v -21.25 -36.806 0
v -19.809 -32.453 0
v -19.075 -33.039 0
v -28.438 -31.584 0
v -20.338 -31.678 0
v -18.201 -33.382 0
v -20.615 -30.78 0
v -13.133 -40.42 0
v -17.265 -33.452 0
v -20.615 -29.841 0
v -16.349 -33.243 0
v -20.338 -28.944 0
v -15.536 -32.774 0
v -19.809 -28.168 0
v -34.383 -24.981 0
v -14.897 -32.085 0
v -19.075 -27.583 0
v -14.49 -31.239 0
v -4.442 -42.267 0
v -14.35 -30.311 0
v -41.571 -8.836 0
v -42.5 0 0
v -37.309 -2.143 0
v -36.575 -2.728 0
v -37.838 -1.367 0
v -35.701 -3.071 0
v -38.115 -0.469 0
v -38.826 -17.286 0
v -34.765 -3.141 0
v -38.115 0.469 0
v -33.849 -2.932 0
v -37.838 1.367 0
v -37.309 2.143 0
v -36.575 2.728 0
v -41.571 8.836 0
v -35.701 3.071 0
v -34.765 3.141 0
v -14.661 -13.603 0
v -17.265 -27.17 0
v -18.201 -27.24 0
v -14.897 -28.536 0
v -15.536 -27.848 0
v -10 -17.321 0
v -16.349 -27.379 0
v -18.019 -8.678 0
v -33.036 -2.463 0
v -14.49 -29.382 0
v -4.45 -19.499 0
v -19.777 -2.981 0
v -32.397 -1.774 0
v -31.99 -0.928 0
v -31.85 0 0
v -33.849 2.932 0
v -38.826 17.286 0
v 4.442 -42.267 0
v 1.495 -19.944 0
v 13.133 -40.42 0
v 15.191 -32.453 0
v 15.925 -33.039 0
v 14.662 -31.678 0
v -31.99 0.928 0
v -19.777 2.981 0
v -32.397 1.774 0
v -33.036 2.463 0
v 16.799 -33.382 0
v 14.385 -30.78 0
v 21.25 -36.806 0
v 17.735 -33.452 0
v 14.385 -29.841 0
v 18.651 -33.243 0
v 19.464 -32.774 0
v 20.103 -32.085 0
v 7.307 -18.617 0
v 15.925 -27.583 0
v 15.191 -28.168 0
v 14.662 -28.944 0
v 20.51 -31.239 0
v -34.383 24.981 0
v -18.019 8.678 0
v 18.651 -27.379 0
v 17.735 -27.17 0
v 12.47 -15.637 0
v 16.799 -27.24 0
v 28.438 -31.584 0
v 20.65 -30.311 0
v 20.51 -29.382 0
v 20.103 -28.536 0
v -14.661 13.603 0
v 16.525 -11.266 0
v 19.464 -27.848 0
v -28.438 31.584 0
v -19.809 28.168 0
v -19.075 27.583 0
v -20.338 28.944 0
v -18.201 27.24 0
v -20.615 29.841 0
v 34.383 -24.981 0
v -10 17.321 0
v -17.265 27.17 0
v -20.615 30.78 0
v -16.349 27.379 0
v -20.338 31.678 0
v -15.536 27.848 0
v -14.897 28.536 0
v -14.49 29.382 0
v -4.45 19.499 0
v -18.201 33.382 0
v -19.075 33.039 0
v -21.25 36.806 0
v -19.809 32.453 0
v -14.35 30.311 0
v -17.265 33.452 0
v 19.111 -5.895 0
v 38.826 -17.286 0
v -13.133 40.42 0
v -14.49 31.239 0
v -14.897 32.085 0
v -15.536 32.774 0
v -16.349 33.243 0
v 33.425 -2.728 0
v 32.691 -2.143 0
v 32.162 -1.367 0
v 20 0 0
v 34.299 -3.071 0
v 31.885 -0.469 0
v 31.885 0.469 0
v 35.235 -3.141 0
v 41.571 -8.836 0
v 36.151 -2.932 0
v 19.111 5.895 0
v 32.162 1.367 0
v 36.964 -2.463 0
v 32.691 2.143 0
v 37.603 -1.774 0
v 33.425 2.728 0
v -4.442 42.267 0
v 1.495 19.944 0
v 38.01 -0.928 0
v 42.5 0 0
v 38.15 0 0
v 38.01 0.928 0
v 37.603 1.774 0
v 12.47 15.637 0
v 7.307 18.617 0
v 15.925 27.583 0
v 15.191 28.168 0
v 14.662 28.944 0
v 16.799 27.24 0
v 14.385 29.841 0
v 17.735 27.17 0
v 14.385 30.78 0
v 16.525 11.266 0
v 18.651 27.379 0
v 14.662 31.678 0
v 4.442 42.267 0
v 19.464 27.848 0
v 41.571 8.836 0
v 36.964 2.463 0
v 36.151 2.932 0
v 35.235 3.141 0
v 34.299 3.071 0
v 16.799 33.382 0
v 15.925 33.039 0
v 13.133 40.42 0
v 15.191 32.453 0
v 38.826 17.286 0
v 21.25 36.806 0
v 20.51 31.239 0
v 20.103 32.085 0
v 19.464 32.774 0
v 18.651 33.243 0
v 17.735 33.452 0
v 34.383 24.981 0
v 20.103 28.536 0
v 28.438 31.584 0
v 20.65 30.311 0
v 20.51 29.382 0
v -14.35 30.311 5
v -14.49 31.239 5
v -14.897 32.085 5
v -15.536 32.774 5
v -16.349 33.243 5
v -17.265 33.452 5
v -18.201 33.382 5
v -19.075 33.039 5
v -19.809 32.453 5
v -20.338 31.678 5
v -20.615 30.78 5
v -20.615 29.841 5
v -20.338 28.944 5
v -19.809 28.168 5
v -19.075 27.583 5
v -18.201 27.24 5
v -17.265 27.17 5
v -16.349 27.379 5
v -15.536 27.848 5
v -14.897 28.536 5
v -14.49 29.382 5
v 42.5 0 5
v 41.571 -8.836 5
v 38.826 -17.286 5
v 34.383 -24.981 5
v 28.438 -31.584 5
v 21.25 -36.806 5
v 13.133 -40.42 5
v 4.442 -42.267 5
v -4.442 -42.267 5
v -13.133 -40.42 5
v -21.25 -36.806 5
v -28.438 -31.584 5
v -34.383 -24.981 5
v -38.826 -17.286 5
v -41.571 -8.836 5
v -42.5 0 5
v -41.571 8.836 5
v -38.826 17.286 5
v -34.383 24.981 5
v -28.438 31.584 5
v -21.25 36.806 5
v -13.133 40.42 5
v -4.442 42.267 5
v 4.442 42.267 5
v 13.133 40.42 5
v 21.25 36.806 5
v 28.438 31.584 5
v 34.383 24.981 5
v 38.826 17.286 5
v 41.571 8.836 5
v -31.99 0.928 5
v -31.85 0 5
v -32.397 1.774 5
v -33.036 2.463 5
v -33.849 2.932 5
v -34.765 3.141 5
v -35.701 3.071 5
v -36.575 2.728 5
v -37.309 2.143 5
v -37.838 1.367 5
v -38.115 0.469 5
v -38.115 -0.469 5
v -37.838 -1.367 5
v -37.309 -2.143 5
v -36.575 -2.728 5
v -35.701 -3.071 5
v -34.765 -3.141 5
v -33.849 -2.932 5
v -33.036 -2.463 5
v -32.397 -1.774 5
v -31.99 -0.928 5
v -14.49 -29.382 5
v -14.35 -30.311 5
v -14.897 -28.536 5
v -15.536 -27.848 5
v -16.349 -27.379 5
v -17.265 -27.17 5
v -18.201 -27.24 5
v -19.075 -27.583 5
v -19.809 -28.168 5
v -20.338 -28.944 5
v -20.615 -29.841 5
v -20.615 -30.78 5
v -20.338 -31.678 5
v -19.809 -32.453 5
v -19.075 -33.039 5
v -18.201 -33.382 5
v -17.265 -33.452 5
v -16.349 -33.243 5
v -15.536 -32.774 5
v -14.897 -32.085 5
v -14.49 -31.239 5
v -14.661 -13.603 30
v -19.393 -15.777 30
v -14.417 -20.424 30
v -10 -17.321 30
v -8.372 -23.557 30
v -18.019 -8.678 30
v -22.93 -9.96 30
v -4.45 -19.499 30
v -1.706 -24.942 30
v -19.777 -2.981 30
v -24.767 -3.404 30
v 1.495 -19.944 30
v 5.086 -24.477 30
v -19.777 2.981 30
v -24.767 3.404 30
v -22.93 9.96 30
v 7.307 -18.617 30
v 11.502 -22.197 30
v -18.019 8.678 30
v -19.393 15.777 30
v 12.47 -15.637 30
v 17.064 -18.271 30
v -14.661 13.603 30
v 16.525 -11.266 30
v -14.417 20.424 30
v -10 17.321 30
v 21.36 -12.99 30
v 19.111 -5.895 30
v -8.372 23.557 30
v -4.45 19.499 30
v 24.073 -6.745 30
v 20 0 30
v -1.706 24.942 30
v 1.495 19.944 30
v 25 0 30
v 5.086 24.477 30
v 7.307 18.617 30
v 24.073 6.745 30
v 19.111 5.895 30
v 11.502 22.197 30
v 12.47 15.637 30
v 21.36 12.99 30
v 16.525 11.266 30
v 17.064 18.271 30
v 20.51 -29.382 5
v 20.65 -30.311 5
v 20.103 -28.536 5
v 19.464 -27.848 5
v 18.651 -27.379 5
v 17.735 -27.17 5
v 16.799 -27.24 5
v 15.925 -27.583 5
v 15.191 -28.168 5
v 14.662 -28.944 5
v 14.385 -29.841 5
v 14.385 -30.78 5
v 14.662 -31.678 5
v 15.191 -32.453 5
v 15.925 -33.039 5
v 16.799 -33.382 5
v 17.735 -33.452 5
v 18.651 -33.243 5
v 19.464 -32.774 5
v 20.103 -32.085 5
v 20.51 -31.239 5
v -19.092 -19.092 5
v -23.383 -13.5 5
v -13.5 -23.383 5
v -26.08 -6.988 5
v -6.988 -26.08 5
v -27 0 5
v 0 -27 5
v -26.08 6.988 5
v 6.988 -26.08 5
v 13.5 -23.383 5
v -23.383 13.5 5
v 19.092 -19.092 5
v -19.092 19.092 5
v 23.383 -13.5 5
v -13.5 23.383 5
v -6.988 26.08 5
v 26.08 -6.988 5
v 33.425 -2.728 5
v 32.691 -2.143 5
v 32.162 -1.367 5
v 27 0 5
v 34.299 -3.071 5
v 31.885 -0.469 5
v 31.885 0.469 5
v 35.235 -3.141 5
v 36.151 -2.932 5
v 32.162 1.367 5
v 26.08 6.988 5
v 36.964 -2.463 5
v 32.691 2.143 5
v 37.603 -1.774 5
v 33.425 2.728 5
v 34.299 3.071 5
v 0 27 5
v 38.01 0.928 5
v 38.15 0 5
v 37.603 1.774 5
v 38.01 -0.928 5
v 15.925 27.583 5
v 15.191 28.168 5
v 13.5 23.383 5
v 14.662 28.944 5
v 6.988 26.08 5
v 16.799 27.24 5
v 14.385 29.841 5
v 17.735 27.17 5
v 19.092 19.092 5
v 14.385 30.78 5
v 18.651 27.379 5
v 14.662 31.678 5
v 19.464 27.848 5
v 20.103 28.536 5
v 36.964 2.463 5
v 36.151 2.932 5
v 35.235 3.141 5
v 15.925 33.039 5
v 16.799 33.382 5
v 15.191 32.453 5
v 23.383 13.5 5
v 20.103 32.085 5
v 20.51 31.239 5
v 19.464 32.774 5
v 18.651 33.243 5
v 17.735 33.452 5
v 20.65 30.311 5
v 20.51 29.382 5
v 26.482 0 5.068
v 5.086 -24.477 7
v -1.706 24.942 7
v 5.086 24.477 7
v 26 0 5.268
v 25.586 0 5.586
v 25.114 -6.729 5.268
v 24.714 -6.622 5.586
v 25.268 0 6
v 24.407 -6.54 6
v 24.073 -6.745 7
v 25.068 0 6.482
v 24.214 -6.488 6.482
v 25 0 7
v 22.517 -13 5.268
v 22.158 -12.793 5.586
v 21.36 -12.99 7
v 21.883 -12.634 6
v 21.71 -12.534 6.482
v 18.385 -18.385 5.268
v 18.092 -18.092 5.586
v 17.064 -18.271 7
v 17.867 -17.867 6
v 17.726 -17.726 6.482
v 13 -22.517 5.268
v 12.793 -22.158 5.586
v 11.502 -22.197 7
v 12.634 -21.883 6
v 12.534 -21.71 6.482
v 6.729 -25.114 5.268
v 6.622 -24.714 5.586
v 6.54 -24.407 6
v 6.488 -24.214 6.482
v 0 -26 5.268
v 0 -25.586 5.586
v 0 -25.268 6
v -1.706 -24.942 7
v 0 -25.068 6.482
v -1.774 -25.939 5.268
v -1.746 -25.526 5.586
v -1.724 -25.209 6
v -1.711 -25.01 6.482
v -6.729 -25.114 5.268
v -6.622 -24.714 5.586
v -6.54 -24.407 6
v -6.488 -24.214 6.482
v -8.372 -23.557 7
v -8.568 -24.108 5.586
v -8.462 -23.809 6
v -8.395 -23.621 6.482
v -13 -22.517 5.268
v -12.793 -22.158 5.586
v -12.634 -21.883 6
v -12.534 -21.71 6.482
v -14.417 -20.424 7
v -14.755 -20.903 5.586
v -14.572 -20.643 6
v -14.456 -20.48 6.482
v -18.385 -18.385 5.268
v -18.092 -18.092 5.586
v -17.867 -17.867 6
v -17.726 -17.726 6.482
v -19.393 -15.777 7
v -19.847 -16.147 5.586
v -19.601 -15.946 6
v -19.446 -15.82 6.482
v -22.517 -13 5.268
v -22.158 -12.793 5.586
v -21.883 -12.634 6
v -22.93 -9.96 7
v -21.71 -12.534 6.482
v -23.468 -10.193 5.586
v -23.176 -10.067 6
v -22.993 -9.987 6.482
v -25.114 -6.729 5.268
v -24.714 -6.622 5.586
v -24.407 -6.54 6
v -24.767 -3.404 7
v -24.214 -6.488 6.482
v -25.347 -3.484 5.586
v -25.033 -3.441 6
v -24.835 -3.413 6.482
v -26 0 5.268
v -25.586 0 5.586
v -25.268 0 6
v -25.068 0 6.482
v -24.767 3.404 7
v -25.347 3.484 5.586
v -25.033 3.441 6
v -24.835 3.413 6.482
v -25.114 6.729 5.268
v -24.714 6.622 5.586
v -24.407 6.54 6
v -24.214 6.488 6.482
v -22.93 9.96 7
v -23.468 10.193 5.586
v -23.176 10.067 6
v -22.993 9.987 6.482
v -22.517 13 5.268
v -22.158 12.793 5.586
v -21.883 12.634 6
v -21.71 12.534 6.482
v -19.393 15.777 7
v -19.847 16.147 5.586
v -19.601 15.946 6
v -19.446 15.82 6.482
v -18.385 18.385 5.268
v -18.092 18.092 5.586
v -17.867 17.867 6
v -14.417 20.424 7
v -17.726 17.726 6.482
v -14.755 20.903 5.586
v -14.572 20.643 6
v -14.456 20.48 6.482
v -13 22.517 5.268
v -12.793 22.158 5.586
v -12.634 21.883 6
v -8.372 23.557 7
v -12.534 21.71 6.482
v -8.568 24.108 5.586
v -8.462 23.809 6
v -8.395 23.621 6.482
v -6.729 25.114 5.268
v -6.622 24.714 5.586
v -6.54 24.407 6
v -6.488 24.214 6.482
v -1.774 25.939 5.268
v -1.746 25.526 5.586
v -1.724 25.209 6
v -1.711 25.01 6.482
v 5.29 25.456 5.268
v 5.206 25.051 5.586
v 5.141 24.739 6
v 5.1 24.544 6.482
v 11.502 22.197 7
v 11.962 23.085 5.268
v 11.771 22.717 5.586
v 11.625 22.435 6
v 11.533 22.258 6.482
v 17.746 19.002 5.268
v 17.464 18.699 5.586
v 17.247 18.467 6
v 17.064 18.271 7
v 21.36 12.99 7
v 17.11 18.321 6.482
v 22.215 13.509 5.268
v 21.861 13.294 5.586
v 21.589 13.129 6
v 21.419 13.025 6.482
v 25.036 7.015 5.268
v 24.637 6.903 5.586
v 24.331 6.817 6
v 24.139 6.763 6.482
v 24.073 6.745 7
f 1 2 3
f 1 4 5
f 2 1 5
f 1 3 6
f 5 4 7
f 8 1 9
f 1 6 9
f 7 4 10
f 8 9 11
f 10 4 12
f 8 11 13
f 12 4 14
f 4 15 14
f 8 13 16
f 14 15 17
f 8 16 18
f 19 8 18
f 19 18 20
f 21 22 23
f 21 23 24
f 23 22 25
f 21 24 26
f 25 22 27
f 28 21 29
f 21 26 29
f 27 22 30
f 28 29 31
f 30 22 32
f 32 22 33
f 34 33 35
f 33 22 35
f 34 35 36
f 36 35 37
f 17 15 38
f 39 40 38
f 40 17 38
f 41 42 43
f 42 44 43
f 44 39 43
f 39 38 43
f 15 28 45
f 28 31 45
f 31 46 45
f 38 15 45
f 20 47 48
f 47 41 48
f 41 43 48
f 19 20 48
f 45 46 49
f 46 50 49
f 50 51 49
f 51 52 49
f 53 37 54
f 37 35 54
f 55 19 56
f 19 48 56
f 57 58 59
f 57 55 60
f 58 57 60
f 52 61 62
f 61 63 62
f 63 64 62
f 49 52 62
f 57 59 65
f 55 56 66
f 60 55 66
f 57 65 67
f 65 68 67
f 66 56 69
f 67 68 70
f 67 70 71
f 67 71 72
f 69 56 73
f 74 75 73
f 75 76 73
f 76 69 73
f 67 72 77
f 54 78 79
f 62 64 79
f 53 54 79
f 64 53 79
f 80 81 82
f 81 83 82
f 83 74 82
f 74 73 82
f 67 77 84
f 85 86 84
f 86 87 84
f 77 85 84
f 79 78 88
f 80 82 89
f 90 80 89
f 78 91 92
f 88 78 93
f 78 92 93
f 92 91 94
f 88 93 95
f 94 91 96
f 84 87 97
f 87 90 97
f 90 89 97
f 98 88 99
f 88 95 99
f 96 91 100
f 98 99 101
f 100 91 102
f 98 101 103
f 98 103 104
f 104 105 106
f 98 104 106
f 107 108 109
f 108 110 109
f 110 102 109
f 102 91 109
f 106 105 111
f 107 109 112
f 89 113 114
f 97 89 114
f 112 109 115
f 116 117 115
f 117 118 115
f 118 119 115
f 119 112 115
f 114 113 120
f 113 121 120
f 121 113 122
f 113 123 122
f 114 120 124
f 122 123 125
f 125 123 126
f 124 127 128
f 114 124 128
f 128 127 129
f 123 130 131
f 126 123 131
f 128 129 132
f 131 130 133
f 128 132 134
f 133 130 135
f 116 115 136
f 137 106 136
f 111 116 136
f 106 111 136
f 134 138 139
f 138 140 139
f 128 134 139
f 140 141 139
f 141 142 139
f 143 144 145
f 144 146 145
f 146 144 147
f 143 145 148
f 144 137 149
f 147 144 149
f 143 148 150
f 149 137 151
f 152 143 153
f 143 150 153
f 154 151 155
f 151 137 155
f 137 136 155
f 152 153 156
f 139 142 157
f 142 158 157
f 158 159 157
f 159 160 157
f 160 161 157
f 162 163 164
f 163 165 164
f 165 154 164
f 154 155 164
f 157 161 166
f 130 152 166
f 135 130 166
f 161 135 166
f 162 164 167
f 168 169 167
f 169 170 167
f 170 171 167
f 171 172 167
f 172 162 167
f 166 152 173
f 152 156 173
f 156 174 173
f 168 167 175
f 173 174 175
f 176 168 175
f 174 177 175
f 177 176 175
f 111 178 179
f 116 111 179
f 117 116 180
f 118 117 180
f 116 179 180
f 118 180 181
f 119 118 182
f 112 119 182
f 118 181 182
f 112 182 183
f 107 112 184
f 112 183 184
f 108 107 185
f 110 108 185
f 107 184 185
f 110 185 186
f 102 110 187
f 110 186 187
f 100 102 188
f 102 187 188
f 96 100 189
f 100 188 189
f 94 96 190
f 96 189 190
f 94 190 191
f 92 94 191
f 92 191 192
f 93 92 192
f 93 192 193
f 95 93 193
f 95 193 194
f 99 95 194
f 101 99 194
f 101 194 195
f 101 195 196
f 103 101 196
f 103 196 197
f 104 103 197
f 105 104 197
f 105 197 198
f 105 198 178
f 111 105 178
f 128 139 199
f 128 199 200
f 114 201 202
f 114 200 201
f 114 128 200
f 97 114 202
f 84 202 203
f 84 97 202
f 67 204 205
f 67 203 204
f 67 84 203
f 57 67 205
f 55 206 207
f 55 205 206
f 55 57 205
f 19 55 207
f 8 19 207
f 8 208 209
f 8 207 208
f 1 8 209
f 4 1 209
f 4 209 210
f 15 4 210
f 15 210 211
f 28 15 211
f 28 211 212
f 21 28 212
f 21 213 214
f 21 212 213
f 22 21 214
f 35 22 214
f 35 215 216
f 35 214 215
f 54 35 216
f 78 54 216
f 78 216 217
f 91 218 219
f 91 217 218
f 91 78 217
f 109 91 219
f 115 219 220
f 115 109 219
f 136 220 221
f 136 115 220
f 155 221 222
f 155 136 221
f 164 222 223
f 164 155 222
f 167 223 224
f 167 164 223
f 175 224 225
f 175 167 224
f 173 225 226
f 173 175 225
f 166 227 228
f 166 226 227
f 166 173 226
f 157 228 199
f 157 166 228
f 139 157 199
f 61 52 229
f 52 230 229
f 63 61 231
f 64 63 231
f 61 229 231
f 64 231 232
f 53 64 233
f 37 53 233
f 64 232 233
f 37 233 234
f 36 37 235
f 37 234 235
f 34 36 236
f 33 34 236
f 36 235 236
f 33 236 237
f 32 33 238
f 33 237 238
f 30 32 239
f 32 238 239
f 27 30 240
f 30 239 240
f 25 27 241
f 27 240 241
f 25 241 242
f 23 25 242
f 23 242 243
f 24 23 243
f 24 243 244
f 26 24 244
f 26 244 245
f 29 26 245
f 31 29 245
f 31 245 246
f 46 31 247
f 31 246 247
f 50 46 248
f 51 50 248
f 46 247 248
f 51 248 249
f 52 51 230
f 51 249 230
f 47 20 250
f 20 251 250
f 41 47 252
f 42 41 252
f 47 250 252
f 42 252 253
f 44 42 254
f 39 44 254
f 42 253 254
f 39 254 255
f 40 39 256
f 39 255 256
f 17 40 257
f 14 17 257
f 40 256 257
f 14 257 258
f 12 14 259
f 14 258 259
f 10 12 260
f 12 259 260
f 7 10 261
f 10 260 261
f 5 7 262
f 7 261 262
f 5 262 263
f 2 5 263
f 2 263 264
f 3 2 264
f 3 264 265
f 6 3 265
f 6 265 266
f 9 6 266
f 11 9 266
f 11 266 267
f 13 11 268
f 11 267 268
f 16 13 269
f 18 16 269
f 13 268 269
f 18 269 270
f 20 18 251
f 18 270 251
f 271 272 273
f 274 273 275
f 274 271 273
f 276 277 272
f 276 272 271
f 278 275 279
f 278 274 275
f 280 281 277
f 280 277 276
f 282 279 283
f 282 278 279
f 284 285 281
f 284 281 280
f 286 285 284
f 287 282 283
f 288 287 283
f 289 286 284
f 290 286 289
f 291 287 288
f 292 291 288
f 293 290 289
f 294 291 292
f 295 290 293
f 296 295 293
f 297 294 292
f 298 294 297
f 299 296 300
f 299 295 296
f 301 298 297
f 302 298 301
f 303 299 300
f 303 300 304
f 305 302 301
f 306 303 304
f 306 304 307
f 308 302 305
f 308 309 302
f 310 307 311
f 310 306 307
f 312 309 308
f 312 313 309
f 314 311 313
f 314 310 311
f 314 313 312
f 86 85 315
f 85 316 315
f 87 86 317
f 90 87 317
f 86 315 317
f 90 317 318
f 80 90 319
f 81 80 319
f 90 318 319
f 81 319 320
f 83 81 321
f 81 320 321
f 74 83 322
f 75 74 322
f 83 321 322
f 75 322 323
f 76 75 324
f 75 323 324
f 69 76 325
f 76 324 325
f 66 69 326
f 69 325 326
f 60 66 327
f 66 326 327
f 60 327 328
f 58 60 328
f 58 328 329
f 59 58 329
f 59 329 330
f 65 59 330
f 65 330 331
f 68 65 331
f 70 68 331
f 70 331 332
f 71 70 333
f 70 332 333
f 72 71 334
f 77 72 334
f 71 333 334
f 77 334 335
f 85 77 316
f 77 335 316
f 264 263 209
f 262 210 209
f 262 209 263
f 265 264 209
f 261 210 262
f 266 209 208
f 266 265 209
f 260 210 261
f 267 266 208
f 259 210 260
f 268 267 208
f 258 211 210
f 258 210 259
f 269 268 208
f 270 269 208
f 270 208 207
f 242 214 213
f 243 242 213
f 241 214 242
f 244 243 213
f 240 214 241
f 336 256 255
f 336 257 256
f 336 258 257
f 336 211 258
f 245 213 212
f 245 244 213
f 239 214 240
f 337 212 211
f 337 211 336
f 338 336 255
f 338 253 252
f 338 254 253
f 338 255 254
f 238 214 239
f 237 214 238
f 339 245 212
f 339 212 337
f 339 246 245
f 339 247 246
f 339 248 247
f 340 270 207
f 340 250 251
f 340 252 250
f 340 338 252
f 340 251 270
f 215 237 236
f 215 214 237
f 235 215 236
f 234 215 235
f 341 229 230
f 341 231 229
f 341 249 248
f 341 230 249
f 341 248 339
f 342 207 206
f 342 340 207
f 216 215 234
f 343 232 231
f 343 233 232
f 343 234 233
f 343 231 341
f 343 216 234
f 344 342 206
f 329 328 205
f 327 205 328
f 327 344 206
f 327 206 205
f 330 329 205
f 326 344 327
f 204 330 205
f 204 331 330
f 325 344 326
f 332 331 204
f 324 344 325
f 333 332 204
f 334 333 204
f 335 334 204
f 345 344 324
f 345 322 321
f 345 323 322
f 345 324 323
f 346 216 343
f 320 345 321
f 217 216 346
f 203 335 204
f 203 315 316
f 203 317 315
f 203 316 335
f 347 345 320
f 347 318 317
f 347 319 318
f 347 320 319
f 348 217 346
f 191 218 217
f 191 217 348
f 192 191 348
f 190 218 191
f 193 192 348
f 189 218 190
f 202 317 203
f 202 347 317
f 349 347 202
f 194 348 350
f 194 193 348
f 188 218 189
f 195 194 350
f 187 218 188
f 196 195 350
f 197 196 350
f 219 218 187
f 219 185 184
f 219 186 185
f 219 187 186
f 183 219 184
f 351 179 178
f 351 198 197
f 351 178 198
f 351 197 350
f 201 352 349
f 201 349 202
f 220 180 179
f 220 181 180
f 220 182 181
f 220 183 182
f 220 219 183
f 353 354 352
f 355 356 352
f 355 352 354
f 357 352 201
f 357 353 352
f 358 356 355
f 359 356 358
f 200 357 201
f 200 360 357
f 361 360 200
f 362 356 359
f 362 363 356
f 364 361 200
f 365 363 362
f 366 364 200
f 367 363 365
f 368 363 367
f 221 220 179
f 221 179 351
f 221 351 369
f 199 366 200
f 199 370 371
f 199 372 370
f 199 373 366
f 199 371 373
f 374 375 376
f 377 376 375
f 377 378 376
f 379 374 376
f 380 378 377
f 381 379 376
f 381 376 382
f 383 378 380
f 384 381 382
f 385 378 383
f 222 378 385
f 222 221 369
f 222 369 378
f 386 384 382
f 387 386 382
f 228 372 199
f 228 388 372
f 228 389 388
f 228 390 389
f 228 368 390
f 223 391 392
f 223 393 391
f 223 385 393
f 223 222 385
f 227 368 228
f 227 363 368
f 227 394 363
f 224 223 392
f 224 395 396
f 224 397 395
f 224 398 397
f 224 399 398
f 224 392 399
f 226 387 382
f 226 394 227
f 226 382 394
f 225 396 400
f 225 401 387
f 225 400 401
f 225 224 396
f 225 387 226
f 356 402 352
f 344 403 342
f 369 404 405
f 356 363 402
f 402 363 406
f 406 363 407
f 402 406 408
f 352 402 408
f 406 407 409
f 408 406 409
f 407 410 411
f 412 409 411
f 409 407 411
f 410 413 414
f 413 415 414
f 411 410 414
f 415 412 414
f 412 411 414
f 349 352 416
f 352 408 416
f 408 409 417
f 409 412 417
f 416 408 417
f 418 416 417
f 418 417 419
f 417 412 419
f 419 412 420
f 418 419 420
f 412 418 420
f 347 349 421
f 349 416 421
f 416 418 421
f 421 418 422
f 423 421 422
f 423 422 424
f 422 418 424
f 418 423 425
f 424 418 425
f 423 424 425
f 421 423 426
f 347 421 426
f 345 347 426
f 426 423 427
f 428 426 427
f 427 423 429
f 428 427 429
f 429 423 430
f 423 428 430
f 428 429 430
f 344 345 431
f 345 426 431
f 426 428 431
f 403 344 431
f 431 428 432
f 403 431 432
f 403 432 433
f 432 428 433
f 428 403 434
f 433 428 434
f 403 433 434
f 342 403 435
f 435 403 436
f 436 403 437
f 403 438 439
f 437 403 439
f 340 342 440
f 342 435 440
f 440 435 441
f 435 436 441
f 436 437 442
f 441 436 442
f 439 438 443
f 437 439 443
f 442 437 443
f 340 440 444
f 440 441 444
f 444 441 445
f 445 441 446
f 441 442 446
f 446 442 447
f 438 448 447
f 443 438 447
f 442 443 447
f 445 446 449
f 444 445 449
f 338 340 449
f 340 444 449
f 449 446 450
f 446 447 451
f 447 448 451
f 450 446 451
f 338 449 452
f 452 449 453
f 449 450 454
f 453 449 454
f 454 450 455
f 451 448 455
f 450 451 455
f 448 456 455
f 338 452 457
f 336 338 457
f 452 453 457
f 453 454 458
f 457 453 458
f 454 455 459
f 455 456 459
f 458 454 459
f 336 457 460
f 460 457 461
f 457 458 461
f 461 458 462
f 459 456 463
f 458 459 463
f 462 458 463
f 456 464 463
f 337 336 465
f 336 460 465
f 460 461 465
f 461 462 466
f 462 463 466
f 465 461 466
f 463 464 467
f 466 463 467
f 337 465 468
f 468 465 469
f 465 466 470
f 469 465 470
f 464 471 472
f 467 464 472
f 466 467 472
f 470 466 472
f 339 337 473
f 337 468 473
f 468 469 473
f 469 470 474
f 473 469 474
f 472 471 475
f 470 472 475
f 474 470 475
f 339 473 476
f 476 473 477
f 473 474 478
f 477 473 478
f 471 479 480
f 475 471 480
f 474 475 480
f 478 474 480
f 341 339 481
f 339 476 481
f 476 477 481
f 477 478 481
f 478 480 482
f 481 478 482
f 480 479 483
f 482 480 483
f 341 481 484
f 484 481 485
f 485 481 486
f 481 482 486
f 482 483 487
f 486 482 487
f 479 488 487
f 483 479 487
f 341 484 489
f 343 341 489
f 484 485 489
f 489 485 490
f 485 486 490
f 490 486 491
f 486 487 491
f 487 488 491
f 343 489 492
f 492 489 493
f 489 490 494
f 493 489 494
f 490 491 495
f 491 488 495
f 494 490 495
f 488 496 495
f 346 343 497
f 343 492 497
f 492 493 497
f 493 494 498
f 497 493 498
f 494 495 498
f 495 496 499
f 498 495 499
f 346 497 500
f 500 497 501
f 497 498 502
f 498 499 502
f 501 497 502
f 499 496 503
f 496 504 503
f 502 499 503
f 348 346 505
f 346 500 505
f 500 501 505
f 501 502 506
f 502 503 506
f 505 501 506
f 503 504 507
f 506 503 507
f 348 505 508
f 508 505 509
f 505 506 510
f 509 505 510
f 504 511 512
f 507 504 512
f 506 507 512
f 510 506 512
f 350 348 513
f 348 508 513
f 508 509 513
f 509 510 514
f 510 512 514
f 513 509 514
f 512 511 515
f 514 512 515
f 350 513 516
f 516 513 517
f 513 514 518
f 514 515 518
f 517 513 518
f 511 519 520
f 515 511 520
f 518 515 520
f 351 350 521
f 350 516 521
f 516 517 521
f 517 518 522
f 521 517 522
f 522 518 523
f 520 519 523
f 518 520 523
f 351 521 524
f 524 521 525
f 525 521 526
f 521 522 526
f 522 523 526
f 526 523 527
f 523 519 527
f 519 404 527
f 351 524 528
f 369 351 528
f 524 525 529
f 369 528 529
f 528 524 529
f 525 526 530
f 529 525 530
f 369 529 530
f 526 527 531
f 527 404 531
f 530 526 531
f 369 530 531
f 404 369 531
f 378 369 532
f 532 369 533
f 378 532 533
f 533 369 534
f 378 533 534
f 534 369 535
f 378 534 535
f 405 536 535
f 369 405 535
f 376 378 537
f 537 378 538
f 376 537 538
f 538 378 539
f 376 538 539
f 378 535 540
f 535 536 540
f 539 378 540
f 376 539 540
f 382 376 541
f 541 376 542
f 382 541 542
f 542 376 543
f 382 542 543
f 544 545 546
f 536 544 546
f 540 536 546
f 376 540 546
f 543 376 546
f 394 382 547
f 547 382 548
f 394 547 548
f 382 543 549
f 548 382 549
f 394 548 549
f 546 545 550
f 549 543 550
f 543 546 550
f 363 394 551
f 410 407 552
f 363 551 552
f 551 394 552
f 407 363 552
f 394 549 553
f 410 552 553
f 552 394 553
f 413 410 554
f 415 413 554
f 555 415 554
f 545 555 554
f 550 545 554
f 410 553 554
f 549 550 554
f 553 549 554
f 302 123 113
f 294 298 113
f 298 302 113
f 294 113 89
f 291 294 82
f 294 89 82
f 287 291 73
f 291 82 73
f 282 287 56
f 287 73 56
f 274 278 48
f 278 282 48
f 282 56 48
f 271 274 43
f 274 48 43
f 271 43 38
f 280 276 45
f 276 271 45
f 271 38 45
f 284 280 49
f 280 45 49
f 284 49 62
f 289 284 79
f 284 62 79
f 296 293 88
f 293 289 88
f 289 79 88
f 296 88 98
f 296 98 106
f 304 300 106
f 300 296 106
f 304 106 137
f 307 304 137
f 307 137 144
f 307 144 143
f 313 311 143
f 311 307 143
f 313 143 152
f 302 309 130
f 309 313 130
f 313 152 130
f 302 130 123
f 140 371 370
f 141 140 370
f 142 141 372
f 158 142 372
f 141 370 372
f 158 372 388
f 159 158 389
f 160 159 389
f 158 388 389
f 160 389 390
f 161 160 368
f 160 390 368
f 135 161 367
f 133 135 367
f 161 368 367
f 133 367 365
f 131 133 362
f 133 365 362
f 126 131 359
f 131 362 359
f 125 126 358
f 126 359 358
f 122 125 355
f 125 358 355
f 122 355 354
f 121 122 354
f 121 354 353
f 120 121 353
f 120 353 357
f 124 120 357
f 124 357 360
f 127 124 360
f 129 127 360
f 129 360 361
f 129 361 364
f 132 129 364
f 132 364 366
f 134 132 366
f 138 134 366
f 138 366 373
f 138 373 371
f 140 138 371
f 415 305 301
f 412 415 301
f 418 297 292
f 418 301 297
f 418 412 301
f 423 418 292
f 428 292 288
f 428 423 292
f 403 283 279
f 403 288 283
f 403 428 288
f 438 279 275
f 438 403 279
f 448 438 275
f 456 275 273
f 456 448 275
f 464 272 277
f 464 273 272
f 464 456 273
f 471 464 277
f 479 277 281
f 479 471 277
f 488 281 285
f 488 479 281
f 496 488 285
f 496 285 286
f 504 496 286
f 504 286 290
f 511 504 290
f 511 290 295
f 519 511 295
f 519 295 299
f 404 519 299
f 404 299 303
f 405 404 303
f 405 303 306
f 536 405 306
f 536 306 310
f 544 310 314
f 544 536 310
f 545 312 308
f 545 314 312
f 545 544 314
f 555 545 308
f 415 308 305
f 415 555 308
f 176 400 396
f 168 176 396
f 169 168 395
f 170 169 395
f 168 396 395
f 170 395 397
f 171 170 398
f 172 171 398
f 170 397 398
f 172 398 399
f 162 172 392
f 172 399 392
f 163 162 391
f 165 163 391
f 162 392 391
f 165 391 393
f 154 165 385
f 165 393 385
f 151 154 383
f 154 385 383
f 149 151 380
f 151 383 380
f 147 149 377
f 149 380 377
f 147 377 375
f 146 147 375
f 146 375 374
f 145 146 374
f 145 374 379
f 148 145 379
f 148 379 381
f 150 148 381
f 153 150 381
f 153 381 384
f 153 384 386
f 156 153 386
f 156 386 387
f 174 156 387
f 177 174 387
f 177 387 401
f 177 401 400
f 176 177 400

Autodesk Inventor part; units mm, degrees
ref_plane "YZ Plane" through (0, 0, 0) normal (1, 0, 0) x (0, 1, 0)
ref_plane "XZ Plane" through (0, 0, 0) normal (0, 1, 0) x (-1, 0, 0)
ref_plane "XY Plane" through (0, 0, 0) normal (0, 0, 1) x (1, 0, 0)
sketch "Sketch7" plane through (0, 0, 0) normal (0, 0, 1) x (1, 0, 0)
  circle A0 centre (0, 0) radius 42.5
  circle A1 centre (0, 0) radius 20
  dimension "d59" = 85
  dimension "d60" = 40
extrude "Extrusion6" add sketch "Sketch7" along normal blind 5
sketch "Sketch8" plane through (0, 0, 5) normal (0, 0, 1) x (1, 0, 0)
  circle A0 centre (0, 0) radius 25
  circle A1 centre (0, 0) radius 20 projected
  dimension "d55" = 50
extrude "Extrusion7" add sketch "Sketch8" along normal blind 25
fillet "Fillet4" radius 2 1 edges at (-25, 0, 5)
sketch "Sketch9" plane through (0, 0, 5) normal (0, 0, 1) x (1, 0, 0)
  circle A0 centre (0, 0) radius 35 construction
  circle A1 centre (-35, 0) radius 3.15
  circle A2 centre (-17.5, -30.3109) radius 3.15
  circle A3 centre (17.5, -30.3109) radius 3.15
  circle A4 centre (35, 0) radius 3.15
  circle A5 centre (17.5, 30.3109) radius 3.15
  circle A6 centre (-17.5, 30.3109) radius 3.15
  dimension "d61" = 70
  dimension "d62" = 6.3
  dimension "d65" = 360
extrude "Extrusion8" cut sketch "Sketch9" against normal through all
properties part number "HOSE-NOZZLE-MOUNTING"
